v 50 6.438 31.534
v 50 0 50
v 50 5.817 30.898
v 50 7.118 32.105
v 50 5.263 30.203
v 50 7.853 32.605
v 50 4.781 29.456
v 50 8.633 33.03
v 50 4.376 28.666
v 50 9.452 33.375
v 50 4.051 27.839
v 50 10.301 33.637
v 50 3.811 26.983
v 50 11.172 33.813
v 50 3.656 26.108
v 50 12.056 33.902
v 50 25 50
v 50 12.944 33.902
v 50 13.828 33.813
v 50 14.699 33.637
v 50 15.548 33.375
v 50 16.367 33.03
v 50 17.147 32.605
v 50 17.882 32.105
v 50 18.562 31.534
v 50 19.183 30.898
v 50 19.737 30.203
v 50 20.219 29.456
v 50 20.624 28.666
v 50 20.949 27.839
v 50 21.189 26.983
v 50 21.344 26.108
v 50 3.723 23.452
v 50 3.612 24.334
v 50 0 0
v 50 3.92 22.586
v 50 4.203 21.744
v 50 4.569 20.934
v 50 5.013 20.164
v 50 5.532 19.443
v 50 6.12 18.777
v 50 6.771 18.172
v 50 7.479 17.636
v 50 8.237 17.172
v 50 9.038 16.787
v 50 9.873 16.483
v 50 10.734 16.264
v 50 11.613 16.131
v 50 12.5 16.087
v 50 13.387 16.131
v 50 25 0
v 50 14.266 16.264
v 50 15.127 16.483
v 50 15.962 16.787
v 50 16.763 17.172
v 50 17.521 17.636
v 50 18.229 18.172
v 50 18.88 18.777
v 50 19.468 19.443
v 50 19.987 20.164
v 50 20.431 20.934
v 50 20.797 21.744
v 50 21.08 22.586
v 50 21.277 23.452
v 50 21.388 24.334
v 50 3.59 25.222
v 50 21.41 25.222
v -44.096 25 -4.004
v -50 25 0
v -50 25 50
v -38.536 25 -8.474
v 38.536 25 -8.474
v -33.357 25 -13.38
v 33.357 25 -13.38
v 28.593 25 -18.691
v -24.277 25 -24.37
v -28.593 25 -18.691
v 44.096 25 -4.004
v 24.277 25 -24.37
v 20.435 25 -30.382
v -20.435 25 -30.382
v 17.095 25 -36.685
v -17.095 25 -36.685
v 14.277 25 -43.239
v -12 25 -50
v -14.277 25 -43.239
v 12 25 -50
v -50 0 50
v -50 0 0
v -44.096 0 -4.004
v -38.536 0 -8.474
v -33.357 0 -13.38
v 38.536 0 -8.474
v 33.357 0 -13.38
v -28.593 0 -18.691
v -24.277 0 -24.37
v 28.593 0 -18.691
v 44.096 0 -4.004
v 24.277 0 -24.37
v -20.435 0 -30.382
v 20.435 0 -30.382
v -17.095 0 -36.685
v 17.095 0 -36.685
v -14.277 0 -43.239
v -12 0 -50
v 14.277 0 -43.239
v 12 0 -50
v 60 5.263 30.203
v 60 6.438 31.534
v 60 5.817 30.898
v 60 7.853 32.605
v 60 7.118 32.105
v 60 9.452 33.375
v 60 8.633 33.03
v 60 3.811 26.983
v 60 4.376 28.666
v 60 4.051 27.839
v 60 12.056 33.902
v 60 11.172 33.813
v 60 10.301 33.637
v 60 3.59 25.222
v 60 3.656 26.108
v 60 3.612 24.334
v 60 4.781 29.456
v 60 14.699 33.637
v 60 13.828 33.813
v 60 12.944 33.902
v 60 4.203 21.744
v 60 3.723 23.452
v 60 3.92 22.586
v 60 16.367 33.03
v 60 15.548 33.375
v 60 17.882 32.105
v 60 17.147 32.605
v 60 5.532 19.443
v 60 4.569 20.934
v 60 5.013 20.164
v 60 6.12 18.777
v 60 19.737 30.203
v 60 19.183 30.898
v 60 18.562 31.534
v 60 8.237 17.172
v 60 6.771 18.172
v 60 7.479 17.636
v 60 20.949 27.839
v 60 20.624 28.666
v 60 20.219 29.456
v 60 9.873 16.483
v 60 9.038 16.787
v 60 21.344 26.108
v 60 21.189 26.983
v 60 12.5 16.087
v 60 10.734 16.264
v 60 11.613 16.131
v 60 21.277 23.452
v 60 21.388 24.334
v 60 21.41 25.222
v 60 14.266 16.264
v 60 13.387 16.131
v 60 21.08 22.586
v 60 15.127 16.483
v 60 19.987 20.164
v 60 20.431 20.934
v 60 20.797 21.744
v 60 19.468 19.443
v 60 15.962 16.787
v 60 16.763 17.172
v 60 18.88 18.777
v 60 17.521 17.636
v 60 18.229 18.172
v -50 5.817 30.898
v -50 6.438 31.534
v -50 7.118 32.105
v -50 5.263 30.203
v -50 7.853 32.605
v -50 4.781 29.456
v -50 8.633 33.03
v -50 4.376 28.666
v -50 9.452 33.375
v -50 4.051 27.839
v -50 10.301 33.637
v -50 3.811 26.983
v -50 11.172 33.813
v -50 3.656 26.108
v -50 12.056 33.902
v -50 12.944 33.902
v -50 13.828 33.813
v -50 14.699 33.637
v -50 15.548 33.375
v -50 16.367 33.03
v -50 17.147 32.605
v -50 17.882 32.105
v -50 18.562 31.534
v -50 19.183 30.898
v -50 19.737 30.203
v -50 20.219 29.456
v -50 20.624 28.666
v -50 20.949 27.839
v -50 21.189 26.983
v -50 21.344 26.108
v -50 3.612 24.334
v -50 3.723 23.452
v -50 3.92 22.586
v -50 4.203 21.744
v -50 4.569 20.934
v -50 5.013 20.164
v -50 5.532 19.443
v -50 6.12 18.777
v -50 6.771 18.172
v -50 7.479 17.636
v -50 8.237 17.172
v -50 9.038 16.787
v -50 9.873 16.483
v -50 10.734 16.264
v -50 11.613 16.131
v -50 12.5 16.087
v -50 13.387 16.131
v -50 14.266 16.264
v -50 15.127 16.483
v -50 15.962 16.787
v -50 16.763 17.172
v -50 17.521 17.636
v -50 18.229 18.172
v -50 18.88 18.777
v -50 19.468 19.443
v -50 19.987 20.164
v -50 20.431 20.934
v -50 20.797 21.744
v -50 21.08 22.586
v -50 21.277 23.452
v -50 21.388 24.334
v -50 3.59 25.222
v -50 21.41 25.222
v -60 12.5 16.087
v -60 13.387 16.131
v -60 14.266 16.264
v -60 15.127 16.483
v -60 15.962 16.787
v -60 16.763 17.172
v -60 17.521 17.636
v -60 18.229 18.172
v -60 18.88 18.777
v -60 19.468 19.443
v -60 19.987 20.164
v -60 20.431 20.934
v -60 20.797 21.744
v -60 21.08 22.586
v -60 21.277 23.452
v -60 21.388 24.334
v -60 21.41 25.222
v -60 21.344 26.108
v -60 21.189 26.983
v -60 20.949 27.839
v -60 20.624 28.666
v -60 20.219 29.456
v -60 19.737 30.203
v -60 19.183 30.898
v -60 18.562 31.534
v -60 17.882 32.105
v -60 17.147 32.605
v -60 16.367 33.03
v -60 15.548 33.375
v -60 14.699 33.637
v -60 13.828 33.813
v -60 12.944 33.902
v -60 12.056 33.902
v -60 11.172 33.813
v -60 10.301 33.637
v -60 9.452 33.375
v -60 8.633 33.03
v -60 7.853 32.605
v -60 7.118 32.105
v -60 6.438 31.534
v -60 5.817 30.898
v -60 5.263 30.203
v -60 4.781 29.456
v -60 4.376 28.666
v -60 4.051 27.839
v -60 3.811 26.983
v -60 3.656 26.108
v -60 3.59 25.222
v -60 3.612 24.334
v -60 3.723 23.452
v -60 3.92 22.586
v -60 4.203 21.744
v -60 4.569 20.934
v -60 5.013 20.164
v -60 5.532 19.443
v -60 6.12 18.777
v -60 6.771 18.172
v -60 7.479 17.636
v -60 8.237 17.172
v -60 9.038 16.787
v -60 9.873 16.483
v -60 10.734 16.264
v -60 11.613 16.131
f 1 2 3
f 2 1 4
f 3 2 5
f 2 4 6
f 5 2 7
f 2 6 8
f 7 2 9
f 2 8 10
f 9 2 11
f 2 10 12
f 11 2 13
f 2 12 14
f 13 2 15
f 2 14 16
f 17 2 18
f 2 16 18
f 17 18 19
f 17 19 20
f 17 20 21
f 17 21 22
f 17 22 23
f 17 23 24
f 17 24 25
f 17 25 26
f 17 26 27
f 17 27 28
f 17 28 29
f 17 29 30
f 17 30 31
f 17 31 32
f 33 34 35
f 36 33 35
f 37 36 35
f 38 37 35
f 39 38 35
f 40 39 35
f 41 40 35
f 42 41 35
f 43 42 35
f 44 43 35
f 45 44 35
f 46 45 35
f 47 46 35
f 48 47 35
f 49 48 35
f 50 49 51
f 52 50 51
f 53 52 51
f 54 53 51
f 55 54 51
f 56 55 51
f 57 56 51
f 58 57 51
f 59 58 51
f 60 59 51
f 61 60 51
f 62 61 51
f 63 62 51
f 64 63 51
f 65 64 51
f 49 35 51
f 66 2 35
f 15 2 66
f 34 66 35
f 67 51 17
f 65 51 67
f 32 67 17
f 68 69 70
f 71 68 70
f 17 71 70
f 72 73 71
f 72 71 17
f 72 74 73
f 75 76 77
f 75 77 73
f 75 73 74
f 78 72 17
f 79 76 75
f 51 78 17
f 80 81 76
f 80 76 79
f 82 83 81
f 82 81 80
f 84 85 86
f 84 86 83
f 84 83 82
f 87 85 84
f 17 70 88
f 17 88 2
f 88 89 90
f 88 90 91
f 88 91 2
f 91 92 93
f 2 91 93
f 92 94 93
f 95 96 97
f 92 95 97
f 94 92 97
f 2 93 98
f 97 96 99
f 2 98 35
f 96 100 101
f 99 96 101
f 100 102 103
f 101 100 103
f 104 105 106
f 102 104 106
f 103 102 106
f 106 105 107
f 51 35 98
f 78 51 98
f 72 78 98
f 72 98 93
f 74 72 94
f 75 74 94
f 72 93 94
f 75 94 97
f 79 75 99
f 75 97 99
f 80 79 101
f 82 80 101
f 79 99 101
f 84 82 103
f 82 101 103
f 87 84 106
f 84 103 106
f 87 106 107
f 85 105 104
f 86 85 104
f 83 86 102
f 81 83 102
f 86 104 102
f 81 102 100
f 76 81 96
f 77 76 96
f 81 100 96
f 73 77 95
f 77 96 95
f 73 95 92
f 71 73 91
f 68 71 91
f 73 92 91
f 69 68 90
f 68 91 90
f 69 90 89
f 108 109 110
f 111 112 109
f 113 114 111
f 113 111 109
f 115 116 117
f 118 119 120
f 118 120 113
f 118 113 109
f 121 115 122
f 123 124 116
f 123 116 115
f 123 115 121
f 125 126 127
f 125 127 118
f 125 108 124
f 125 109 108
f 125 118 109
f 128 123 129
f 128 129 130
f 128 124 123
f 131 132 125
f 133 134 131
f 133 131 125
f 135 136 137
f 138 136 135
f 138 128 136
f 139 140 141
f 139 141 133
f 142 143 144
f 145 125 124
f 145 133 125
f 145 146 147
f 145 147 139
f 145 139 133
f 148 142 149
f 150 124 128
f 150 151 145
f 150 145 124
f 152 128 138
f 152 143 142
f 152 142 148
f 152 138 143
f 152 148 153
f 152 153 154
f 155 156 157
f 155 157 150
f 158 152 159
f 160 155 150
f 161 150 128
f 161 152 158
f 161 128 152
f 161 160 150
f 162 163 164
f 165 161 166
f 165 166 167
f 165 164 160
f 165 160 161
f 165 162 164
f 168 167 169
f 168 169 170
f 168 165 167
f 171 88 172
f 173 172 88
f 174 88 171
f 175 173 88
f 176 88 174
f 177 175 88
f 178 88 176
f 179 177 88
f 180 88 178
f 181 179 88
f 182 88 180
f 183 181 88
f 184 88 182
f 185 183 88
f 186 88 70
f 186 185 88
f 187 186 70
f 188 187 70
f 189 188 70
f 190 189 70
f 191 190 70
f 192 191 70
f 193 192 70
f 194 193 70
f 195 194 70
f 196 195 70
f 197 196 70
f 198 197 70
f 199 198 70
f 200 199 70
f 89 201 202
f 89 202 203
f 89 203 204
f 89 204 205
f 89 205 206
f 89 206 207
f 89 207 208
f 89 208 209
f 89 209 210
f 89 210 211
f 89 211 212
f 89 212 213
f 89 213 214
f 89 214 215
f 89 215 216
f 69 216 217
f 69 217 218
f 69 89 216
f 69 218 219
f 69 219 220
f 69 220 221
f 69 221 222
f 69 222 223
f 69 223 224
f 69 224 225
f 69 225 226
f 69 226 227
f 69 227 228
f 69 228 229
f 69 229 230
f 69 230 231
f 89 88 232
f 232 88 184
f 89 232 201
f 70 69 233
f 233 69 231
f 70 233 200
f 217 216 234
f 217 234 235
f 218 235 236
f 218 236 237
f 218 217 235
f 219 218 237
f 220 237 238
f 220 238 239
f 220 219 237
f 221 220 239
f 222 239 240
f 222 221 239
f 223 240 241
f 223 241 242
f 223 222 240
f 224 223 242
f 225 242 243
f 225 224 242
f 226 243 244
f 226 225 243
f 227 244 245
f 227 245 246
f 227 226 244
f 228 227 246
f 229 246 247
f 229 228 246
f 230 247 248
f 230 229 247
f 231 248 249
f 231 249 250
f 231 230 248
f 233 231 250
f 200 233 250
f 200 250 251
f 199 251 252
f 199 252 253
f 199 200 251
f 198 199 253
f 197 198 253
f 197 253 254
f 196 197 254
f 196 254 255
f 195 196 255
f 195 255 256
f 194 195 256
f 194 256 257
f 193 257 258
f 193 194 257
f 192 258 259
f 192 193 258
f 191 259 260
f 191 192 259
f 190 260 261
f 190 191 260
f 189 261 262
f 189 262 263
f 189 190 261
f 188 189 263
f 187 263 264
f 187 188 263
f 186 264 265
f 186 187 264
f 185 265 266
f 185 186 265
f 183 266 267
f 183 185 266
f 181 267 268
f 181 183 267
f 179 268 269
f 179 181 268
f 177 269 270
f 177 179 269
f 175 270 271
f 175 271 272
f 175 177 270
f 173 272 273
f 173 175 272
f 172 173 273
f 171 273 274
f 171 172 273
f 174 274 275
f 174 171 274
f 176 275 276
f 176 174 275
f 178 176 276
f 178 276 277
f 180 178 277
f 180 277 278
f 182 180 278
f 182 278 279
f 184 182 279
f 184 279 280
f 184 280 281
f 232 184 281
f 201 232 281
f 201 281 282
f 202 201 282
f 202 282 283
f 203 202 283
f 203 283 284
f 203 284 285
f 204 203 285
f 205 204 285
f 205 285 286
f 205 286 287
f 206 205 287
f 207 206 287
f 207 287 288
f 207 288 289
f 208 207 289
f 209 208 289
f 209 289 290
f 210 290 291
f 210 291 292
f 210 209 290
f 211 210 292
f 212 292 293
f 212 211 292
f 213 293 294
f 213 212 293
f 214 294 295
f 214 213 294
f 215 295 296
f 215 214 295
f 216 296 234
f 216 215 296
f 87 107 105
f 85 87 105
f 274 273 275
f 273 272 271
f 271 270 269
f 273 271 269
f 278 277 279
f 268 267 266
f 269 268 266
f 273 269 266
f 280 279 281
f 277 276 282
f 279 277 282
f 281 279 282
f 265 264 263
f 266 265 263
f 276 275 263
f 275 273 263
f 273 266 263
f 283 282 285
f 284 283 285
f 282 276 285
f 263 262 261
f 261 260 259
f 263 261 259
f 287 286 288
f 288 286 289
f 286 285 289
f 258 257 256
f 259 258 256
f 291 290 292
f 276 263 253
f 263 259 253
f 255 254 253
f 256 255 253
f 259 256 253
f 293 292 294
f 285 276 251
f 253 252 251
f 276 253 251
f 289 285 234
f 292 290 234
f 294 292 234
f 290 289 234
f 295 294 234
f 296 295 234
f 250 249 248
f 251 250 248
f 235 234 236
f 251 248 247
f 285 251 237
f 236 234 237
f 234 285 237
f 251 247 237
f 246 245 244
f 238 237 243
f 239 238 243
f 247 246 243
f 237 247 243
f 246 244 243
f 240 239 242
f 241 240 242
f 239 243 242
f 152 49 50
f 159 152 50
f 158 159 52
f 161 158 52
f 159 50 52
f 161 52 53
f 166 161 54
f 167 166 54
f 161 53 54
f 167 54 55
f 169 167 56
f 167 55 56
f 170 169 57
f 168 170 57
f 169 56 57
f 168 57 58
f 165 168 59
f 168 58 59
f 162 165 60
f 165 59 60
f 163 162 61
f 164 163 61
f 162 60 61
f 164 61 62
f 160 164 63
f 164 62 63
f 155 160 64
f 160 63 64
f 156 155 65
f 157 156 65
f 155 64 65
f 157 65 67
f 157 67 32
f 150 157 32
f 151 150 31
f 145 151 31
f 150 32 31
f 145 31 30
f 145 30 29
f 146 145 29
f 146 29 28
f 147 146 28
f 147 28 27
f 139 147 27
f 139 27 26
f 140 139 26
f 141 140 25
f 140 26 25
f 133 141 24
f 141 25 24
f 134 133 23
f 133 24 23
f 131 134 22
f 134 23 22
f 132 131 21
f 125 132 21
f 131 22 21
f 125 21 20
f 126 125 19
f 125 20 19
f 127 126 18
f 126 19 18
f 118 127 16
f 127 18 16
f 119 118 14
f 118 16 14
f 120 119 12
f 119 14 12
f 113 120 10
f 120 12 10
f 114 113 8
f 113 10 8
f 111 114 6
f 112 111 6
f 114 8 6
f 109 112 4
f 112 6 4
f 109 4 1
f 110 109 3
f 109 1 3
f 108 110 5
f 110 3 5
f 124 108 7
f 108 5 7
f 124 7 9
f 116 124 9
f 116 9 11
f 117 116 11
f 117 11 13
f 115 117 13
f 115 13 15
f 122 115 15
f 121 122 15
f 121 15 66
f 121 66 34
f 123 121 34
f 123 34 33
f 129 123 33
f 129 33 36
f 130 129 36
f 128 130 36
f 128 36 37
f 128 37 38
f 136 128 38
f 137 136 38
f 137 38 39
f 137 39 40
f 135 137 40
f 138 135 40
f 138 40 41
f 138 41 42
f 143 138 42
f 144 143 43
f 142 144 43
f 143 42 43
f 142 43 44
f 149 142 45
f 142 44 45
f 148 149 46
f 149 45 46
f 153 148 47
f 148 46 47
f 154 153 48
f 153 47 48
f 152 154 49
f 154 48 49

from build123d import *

# Parameters (mm, degrees)
SALIENTE_EXTRUIR1_DEPTH = 25
CROQUIS2_W              = 100
CROQUIS2_H              = 25
SALIENTE_EXTRUIR2_DEPTH = 50
CROQUIS3_R              = 8.912899487
SALIENTE_EXTRUIR3_DEPTH = 10


with BuildPart() as part:
    # Croquis1 → Saliente-Extruir1 (new body)
    with BuildSketch(Plane(origin=(0, 0, 0), x_dir=(1, 0, 0), z_dir=(0, 1, 0))):
        with BuildLine():
            Line((-50, 0), (50, 0))
            ThreePointArc((50, 0), (26.377279403, 21.486732346), (12, 50))
            Line((12, 50), (-12, 50))
            ThreePointArc((-12, 50), (-26.377279403, 21.486732346), (-50, 0))
        make_face()
    extrude(amount=SALIENTE_EXTRUIR1_DEPTH)

    # Croquis2 → Saliente-Extruir2 (add)
    with BuildSketch(Plane.XY):
        with Locations((0, 12.5)):
            Rectangle(CROQUIS2_W, CROQUIS2_H)
    extrude(amount=SALIENTE_EXTRUIR2_DEPTH)

    # Croquis3 → Saliente-Extruir3 (add)
    with BuildSketch(Plane(origin=(50, 0, 0), x_dir=(0, 0, -1), z_dir=(1, 0, 0))):
        with Locations((-25, 12.5)):
            Circle(CROQUIS3_R)
    saliente_extruir3 = extrude(amount=SALIENTE_EXTRUIR3_DEPTH)

    # Simetría1: Saliente-Extruir3 across plane
    add(saliente_extruir3.mirror(Plane(origin=(0, 0, 0), x_dir=(0, 0, 1), z_dir=(1, 0, 0))))


solid = part.part
